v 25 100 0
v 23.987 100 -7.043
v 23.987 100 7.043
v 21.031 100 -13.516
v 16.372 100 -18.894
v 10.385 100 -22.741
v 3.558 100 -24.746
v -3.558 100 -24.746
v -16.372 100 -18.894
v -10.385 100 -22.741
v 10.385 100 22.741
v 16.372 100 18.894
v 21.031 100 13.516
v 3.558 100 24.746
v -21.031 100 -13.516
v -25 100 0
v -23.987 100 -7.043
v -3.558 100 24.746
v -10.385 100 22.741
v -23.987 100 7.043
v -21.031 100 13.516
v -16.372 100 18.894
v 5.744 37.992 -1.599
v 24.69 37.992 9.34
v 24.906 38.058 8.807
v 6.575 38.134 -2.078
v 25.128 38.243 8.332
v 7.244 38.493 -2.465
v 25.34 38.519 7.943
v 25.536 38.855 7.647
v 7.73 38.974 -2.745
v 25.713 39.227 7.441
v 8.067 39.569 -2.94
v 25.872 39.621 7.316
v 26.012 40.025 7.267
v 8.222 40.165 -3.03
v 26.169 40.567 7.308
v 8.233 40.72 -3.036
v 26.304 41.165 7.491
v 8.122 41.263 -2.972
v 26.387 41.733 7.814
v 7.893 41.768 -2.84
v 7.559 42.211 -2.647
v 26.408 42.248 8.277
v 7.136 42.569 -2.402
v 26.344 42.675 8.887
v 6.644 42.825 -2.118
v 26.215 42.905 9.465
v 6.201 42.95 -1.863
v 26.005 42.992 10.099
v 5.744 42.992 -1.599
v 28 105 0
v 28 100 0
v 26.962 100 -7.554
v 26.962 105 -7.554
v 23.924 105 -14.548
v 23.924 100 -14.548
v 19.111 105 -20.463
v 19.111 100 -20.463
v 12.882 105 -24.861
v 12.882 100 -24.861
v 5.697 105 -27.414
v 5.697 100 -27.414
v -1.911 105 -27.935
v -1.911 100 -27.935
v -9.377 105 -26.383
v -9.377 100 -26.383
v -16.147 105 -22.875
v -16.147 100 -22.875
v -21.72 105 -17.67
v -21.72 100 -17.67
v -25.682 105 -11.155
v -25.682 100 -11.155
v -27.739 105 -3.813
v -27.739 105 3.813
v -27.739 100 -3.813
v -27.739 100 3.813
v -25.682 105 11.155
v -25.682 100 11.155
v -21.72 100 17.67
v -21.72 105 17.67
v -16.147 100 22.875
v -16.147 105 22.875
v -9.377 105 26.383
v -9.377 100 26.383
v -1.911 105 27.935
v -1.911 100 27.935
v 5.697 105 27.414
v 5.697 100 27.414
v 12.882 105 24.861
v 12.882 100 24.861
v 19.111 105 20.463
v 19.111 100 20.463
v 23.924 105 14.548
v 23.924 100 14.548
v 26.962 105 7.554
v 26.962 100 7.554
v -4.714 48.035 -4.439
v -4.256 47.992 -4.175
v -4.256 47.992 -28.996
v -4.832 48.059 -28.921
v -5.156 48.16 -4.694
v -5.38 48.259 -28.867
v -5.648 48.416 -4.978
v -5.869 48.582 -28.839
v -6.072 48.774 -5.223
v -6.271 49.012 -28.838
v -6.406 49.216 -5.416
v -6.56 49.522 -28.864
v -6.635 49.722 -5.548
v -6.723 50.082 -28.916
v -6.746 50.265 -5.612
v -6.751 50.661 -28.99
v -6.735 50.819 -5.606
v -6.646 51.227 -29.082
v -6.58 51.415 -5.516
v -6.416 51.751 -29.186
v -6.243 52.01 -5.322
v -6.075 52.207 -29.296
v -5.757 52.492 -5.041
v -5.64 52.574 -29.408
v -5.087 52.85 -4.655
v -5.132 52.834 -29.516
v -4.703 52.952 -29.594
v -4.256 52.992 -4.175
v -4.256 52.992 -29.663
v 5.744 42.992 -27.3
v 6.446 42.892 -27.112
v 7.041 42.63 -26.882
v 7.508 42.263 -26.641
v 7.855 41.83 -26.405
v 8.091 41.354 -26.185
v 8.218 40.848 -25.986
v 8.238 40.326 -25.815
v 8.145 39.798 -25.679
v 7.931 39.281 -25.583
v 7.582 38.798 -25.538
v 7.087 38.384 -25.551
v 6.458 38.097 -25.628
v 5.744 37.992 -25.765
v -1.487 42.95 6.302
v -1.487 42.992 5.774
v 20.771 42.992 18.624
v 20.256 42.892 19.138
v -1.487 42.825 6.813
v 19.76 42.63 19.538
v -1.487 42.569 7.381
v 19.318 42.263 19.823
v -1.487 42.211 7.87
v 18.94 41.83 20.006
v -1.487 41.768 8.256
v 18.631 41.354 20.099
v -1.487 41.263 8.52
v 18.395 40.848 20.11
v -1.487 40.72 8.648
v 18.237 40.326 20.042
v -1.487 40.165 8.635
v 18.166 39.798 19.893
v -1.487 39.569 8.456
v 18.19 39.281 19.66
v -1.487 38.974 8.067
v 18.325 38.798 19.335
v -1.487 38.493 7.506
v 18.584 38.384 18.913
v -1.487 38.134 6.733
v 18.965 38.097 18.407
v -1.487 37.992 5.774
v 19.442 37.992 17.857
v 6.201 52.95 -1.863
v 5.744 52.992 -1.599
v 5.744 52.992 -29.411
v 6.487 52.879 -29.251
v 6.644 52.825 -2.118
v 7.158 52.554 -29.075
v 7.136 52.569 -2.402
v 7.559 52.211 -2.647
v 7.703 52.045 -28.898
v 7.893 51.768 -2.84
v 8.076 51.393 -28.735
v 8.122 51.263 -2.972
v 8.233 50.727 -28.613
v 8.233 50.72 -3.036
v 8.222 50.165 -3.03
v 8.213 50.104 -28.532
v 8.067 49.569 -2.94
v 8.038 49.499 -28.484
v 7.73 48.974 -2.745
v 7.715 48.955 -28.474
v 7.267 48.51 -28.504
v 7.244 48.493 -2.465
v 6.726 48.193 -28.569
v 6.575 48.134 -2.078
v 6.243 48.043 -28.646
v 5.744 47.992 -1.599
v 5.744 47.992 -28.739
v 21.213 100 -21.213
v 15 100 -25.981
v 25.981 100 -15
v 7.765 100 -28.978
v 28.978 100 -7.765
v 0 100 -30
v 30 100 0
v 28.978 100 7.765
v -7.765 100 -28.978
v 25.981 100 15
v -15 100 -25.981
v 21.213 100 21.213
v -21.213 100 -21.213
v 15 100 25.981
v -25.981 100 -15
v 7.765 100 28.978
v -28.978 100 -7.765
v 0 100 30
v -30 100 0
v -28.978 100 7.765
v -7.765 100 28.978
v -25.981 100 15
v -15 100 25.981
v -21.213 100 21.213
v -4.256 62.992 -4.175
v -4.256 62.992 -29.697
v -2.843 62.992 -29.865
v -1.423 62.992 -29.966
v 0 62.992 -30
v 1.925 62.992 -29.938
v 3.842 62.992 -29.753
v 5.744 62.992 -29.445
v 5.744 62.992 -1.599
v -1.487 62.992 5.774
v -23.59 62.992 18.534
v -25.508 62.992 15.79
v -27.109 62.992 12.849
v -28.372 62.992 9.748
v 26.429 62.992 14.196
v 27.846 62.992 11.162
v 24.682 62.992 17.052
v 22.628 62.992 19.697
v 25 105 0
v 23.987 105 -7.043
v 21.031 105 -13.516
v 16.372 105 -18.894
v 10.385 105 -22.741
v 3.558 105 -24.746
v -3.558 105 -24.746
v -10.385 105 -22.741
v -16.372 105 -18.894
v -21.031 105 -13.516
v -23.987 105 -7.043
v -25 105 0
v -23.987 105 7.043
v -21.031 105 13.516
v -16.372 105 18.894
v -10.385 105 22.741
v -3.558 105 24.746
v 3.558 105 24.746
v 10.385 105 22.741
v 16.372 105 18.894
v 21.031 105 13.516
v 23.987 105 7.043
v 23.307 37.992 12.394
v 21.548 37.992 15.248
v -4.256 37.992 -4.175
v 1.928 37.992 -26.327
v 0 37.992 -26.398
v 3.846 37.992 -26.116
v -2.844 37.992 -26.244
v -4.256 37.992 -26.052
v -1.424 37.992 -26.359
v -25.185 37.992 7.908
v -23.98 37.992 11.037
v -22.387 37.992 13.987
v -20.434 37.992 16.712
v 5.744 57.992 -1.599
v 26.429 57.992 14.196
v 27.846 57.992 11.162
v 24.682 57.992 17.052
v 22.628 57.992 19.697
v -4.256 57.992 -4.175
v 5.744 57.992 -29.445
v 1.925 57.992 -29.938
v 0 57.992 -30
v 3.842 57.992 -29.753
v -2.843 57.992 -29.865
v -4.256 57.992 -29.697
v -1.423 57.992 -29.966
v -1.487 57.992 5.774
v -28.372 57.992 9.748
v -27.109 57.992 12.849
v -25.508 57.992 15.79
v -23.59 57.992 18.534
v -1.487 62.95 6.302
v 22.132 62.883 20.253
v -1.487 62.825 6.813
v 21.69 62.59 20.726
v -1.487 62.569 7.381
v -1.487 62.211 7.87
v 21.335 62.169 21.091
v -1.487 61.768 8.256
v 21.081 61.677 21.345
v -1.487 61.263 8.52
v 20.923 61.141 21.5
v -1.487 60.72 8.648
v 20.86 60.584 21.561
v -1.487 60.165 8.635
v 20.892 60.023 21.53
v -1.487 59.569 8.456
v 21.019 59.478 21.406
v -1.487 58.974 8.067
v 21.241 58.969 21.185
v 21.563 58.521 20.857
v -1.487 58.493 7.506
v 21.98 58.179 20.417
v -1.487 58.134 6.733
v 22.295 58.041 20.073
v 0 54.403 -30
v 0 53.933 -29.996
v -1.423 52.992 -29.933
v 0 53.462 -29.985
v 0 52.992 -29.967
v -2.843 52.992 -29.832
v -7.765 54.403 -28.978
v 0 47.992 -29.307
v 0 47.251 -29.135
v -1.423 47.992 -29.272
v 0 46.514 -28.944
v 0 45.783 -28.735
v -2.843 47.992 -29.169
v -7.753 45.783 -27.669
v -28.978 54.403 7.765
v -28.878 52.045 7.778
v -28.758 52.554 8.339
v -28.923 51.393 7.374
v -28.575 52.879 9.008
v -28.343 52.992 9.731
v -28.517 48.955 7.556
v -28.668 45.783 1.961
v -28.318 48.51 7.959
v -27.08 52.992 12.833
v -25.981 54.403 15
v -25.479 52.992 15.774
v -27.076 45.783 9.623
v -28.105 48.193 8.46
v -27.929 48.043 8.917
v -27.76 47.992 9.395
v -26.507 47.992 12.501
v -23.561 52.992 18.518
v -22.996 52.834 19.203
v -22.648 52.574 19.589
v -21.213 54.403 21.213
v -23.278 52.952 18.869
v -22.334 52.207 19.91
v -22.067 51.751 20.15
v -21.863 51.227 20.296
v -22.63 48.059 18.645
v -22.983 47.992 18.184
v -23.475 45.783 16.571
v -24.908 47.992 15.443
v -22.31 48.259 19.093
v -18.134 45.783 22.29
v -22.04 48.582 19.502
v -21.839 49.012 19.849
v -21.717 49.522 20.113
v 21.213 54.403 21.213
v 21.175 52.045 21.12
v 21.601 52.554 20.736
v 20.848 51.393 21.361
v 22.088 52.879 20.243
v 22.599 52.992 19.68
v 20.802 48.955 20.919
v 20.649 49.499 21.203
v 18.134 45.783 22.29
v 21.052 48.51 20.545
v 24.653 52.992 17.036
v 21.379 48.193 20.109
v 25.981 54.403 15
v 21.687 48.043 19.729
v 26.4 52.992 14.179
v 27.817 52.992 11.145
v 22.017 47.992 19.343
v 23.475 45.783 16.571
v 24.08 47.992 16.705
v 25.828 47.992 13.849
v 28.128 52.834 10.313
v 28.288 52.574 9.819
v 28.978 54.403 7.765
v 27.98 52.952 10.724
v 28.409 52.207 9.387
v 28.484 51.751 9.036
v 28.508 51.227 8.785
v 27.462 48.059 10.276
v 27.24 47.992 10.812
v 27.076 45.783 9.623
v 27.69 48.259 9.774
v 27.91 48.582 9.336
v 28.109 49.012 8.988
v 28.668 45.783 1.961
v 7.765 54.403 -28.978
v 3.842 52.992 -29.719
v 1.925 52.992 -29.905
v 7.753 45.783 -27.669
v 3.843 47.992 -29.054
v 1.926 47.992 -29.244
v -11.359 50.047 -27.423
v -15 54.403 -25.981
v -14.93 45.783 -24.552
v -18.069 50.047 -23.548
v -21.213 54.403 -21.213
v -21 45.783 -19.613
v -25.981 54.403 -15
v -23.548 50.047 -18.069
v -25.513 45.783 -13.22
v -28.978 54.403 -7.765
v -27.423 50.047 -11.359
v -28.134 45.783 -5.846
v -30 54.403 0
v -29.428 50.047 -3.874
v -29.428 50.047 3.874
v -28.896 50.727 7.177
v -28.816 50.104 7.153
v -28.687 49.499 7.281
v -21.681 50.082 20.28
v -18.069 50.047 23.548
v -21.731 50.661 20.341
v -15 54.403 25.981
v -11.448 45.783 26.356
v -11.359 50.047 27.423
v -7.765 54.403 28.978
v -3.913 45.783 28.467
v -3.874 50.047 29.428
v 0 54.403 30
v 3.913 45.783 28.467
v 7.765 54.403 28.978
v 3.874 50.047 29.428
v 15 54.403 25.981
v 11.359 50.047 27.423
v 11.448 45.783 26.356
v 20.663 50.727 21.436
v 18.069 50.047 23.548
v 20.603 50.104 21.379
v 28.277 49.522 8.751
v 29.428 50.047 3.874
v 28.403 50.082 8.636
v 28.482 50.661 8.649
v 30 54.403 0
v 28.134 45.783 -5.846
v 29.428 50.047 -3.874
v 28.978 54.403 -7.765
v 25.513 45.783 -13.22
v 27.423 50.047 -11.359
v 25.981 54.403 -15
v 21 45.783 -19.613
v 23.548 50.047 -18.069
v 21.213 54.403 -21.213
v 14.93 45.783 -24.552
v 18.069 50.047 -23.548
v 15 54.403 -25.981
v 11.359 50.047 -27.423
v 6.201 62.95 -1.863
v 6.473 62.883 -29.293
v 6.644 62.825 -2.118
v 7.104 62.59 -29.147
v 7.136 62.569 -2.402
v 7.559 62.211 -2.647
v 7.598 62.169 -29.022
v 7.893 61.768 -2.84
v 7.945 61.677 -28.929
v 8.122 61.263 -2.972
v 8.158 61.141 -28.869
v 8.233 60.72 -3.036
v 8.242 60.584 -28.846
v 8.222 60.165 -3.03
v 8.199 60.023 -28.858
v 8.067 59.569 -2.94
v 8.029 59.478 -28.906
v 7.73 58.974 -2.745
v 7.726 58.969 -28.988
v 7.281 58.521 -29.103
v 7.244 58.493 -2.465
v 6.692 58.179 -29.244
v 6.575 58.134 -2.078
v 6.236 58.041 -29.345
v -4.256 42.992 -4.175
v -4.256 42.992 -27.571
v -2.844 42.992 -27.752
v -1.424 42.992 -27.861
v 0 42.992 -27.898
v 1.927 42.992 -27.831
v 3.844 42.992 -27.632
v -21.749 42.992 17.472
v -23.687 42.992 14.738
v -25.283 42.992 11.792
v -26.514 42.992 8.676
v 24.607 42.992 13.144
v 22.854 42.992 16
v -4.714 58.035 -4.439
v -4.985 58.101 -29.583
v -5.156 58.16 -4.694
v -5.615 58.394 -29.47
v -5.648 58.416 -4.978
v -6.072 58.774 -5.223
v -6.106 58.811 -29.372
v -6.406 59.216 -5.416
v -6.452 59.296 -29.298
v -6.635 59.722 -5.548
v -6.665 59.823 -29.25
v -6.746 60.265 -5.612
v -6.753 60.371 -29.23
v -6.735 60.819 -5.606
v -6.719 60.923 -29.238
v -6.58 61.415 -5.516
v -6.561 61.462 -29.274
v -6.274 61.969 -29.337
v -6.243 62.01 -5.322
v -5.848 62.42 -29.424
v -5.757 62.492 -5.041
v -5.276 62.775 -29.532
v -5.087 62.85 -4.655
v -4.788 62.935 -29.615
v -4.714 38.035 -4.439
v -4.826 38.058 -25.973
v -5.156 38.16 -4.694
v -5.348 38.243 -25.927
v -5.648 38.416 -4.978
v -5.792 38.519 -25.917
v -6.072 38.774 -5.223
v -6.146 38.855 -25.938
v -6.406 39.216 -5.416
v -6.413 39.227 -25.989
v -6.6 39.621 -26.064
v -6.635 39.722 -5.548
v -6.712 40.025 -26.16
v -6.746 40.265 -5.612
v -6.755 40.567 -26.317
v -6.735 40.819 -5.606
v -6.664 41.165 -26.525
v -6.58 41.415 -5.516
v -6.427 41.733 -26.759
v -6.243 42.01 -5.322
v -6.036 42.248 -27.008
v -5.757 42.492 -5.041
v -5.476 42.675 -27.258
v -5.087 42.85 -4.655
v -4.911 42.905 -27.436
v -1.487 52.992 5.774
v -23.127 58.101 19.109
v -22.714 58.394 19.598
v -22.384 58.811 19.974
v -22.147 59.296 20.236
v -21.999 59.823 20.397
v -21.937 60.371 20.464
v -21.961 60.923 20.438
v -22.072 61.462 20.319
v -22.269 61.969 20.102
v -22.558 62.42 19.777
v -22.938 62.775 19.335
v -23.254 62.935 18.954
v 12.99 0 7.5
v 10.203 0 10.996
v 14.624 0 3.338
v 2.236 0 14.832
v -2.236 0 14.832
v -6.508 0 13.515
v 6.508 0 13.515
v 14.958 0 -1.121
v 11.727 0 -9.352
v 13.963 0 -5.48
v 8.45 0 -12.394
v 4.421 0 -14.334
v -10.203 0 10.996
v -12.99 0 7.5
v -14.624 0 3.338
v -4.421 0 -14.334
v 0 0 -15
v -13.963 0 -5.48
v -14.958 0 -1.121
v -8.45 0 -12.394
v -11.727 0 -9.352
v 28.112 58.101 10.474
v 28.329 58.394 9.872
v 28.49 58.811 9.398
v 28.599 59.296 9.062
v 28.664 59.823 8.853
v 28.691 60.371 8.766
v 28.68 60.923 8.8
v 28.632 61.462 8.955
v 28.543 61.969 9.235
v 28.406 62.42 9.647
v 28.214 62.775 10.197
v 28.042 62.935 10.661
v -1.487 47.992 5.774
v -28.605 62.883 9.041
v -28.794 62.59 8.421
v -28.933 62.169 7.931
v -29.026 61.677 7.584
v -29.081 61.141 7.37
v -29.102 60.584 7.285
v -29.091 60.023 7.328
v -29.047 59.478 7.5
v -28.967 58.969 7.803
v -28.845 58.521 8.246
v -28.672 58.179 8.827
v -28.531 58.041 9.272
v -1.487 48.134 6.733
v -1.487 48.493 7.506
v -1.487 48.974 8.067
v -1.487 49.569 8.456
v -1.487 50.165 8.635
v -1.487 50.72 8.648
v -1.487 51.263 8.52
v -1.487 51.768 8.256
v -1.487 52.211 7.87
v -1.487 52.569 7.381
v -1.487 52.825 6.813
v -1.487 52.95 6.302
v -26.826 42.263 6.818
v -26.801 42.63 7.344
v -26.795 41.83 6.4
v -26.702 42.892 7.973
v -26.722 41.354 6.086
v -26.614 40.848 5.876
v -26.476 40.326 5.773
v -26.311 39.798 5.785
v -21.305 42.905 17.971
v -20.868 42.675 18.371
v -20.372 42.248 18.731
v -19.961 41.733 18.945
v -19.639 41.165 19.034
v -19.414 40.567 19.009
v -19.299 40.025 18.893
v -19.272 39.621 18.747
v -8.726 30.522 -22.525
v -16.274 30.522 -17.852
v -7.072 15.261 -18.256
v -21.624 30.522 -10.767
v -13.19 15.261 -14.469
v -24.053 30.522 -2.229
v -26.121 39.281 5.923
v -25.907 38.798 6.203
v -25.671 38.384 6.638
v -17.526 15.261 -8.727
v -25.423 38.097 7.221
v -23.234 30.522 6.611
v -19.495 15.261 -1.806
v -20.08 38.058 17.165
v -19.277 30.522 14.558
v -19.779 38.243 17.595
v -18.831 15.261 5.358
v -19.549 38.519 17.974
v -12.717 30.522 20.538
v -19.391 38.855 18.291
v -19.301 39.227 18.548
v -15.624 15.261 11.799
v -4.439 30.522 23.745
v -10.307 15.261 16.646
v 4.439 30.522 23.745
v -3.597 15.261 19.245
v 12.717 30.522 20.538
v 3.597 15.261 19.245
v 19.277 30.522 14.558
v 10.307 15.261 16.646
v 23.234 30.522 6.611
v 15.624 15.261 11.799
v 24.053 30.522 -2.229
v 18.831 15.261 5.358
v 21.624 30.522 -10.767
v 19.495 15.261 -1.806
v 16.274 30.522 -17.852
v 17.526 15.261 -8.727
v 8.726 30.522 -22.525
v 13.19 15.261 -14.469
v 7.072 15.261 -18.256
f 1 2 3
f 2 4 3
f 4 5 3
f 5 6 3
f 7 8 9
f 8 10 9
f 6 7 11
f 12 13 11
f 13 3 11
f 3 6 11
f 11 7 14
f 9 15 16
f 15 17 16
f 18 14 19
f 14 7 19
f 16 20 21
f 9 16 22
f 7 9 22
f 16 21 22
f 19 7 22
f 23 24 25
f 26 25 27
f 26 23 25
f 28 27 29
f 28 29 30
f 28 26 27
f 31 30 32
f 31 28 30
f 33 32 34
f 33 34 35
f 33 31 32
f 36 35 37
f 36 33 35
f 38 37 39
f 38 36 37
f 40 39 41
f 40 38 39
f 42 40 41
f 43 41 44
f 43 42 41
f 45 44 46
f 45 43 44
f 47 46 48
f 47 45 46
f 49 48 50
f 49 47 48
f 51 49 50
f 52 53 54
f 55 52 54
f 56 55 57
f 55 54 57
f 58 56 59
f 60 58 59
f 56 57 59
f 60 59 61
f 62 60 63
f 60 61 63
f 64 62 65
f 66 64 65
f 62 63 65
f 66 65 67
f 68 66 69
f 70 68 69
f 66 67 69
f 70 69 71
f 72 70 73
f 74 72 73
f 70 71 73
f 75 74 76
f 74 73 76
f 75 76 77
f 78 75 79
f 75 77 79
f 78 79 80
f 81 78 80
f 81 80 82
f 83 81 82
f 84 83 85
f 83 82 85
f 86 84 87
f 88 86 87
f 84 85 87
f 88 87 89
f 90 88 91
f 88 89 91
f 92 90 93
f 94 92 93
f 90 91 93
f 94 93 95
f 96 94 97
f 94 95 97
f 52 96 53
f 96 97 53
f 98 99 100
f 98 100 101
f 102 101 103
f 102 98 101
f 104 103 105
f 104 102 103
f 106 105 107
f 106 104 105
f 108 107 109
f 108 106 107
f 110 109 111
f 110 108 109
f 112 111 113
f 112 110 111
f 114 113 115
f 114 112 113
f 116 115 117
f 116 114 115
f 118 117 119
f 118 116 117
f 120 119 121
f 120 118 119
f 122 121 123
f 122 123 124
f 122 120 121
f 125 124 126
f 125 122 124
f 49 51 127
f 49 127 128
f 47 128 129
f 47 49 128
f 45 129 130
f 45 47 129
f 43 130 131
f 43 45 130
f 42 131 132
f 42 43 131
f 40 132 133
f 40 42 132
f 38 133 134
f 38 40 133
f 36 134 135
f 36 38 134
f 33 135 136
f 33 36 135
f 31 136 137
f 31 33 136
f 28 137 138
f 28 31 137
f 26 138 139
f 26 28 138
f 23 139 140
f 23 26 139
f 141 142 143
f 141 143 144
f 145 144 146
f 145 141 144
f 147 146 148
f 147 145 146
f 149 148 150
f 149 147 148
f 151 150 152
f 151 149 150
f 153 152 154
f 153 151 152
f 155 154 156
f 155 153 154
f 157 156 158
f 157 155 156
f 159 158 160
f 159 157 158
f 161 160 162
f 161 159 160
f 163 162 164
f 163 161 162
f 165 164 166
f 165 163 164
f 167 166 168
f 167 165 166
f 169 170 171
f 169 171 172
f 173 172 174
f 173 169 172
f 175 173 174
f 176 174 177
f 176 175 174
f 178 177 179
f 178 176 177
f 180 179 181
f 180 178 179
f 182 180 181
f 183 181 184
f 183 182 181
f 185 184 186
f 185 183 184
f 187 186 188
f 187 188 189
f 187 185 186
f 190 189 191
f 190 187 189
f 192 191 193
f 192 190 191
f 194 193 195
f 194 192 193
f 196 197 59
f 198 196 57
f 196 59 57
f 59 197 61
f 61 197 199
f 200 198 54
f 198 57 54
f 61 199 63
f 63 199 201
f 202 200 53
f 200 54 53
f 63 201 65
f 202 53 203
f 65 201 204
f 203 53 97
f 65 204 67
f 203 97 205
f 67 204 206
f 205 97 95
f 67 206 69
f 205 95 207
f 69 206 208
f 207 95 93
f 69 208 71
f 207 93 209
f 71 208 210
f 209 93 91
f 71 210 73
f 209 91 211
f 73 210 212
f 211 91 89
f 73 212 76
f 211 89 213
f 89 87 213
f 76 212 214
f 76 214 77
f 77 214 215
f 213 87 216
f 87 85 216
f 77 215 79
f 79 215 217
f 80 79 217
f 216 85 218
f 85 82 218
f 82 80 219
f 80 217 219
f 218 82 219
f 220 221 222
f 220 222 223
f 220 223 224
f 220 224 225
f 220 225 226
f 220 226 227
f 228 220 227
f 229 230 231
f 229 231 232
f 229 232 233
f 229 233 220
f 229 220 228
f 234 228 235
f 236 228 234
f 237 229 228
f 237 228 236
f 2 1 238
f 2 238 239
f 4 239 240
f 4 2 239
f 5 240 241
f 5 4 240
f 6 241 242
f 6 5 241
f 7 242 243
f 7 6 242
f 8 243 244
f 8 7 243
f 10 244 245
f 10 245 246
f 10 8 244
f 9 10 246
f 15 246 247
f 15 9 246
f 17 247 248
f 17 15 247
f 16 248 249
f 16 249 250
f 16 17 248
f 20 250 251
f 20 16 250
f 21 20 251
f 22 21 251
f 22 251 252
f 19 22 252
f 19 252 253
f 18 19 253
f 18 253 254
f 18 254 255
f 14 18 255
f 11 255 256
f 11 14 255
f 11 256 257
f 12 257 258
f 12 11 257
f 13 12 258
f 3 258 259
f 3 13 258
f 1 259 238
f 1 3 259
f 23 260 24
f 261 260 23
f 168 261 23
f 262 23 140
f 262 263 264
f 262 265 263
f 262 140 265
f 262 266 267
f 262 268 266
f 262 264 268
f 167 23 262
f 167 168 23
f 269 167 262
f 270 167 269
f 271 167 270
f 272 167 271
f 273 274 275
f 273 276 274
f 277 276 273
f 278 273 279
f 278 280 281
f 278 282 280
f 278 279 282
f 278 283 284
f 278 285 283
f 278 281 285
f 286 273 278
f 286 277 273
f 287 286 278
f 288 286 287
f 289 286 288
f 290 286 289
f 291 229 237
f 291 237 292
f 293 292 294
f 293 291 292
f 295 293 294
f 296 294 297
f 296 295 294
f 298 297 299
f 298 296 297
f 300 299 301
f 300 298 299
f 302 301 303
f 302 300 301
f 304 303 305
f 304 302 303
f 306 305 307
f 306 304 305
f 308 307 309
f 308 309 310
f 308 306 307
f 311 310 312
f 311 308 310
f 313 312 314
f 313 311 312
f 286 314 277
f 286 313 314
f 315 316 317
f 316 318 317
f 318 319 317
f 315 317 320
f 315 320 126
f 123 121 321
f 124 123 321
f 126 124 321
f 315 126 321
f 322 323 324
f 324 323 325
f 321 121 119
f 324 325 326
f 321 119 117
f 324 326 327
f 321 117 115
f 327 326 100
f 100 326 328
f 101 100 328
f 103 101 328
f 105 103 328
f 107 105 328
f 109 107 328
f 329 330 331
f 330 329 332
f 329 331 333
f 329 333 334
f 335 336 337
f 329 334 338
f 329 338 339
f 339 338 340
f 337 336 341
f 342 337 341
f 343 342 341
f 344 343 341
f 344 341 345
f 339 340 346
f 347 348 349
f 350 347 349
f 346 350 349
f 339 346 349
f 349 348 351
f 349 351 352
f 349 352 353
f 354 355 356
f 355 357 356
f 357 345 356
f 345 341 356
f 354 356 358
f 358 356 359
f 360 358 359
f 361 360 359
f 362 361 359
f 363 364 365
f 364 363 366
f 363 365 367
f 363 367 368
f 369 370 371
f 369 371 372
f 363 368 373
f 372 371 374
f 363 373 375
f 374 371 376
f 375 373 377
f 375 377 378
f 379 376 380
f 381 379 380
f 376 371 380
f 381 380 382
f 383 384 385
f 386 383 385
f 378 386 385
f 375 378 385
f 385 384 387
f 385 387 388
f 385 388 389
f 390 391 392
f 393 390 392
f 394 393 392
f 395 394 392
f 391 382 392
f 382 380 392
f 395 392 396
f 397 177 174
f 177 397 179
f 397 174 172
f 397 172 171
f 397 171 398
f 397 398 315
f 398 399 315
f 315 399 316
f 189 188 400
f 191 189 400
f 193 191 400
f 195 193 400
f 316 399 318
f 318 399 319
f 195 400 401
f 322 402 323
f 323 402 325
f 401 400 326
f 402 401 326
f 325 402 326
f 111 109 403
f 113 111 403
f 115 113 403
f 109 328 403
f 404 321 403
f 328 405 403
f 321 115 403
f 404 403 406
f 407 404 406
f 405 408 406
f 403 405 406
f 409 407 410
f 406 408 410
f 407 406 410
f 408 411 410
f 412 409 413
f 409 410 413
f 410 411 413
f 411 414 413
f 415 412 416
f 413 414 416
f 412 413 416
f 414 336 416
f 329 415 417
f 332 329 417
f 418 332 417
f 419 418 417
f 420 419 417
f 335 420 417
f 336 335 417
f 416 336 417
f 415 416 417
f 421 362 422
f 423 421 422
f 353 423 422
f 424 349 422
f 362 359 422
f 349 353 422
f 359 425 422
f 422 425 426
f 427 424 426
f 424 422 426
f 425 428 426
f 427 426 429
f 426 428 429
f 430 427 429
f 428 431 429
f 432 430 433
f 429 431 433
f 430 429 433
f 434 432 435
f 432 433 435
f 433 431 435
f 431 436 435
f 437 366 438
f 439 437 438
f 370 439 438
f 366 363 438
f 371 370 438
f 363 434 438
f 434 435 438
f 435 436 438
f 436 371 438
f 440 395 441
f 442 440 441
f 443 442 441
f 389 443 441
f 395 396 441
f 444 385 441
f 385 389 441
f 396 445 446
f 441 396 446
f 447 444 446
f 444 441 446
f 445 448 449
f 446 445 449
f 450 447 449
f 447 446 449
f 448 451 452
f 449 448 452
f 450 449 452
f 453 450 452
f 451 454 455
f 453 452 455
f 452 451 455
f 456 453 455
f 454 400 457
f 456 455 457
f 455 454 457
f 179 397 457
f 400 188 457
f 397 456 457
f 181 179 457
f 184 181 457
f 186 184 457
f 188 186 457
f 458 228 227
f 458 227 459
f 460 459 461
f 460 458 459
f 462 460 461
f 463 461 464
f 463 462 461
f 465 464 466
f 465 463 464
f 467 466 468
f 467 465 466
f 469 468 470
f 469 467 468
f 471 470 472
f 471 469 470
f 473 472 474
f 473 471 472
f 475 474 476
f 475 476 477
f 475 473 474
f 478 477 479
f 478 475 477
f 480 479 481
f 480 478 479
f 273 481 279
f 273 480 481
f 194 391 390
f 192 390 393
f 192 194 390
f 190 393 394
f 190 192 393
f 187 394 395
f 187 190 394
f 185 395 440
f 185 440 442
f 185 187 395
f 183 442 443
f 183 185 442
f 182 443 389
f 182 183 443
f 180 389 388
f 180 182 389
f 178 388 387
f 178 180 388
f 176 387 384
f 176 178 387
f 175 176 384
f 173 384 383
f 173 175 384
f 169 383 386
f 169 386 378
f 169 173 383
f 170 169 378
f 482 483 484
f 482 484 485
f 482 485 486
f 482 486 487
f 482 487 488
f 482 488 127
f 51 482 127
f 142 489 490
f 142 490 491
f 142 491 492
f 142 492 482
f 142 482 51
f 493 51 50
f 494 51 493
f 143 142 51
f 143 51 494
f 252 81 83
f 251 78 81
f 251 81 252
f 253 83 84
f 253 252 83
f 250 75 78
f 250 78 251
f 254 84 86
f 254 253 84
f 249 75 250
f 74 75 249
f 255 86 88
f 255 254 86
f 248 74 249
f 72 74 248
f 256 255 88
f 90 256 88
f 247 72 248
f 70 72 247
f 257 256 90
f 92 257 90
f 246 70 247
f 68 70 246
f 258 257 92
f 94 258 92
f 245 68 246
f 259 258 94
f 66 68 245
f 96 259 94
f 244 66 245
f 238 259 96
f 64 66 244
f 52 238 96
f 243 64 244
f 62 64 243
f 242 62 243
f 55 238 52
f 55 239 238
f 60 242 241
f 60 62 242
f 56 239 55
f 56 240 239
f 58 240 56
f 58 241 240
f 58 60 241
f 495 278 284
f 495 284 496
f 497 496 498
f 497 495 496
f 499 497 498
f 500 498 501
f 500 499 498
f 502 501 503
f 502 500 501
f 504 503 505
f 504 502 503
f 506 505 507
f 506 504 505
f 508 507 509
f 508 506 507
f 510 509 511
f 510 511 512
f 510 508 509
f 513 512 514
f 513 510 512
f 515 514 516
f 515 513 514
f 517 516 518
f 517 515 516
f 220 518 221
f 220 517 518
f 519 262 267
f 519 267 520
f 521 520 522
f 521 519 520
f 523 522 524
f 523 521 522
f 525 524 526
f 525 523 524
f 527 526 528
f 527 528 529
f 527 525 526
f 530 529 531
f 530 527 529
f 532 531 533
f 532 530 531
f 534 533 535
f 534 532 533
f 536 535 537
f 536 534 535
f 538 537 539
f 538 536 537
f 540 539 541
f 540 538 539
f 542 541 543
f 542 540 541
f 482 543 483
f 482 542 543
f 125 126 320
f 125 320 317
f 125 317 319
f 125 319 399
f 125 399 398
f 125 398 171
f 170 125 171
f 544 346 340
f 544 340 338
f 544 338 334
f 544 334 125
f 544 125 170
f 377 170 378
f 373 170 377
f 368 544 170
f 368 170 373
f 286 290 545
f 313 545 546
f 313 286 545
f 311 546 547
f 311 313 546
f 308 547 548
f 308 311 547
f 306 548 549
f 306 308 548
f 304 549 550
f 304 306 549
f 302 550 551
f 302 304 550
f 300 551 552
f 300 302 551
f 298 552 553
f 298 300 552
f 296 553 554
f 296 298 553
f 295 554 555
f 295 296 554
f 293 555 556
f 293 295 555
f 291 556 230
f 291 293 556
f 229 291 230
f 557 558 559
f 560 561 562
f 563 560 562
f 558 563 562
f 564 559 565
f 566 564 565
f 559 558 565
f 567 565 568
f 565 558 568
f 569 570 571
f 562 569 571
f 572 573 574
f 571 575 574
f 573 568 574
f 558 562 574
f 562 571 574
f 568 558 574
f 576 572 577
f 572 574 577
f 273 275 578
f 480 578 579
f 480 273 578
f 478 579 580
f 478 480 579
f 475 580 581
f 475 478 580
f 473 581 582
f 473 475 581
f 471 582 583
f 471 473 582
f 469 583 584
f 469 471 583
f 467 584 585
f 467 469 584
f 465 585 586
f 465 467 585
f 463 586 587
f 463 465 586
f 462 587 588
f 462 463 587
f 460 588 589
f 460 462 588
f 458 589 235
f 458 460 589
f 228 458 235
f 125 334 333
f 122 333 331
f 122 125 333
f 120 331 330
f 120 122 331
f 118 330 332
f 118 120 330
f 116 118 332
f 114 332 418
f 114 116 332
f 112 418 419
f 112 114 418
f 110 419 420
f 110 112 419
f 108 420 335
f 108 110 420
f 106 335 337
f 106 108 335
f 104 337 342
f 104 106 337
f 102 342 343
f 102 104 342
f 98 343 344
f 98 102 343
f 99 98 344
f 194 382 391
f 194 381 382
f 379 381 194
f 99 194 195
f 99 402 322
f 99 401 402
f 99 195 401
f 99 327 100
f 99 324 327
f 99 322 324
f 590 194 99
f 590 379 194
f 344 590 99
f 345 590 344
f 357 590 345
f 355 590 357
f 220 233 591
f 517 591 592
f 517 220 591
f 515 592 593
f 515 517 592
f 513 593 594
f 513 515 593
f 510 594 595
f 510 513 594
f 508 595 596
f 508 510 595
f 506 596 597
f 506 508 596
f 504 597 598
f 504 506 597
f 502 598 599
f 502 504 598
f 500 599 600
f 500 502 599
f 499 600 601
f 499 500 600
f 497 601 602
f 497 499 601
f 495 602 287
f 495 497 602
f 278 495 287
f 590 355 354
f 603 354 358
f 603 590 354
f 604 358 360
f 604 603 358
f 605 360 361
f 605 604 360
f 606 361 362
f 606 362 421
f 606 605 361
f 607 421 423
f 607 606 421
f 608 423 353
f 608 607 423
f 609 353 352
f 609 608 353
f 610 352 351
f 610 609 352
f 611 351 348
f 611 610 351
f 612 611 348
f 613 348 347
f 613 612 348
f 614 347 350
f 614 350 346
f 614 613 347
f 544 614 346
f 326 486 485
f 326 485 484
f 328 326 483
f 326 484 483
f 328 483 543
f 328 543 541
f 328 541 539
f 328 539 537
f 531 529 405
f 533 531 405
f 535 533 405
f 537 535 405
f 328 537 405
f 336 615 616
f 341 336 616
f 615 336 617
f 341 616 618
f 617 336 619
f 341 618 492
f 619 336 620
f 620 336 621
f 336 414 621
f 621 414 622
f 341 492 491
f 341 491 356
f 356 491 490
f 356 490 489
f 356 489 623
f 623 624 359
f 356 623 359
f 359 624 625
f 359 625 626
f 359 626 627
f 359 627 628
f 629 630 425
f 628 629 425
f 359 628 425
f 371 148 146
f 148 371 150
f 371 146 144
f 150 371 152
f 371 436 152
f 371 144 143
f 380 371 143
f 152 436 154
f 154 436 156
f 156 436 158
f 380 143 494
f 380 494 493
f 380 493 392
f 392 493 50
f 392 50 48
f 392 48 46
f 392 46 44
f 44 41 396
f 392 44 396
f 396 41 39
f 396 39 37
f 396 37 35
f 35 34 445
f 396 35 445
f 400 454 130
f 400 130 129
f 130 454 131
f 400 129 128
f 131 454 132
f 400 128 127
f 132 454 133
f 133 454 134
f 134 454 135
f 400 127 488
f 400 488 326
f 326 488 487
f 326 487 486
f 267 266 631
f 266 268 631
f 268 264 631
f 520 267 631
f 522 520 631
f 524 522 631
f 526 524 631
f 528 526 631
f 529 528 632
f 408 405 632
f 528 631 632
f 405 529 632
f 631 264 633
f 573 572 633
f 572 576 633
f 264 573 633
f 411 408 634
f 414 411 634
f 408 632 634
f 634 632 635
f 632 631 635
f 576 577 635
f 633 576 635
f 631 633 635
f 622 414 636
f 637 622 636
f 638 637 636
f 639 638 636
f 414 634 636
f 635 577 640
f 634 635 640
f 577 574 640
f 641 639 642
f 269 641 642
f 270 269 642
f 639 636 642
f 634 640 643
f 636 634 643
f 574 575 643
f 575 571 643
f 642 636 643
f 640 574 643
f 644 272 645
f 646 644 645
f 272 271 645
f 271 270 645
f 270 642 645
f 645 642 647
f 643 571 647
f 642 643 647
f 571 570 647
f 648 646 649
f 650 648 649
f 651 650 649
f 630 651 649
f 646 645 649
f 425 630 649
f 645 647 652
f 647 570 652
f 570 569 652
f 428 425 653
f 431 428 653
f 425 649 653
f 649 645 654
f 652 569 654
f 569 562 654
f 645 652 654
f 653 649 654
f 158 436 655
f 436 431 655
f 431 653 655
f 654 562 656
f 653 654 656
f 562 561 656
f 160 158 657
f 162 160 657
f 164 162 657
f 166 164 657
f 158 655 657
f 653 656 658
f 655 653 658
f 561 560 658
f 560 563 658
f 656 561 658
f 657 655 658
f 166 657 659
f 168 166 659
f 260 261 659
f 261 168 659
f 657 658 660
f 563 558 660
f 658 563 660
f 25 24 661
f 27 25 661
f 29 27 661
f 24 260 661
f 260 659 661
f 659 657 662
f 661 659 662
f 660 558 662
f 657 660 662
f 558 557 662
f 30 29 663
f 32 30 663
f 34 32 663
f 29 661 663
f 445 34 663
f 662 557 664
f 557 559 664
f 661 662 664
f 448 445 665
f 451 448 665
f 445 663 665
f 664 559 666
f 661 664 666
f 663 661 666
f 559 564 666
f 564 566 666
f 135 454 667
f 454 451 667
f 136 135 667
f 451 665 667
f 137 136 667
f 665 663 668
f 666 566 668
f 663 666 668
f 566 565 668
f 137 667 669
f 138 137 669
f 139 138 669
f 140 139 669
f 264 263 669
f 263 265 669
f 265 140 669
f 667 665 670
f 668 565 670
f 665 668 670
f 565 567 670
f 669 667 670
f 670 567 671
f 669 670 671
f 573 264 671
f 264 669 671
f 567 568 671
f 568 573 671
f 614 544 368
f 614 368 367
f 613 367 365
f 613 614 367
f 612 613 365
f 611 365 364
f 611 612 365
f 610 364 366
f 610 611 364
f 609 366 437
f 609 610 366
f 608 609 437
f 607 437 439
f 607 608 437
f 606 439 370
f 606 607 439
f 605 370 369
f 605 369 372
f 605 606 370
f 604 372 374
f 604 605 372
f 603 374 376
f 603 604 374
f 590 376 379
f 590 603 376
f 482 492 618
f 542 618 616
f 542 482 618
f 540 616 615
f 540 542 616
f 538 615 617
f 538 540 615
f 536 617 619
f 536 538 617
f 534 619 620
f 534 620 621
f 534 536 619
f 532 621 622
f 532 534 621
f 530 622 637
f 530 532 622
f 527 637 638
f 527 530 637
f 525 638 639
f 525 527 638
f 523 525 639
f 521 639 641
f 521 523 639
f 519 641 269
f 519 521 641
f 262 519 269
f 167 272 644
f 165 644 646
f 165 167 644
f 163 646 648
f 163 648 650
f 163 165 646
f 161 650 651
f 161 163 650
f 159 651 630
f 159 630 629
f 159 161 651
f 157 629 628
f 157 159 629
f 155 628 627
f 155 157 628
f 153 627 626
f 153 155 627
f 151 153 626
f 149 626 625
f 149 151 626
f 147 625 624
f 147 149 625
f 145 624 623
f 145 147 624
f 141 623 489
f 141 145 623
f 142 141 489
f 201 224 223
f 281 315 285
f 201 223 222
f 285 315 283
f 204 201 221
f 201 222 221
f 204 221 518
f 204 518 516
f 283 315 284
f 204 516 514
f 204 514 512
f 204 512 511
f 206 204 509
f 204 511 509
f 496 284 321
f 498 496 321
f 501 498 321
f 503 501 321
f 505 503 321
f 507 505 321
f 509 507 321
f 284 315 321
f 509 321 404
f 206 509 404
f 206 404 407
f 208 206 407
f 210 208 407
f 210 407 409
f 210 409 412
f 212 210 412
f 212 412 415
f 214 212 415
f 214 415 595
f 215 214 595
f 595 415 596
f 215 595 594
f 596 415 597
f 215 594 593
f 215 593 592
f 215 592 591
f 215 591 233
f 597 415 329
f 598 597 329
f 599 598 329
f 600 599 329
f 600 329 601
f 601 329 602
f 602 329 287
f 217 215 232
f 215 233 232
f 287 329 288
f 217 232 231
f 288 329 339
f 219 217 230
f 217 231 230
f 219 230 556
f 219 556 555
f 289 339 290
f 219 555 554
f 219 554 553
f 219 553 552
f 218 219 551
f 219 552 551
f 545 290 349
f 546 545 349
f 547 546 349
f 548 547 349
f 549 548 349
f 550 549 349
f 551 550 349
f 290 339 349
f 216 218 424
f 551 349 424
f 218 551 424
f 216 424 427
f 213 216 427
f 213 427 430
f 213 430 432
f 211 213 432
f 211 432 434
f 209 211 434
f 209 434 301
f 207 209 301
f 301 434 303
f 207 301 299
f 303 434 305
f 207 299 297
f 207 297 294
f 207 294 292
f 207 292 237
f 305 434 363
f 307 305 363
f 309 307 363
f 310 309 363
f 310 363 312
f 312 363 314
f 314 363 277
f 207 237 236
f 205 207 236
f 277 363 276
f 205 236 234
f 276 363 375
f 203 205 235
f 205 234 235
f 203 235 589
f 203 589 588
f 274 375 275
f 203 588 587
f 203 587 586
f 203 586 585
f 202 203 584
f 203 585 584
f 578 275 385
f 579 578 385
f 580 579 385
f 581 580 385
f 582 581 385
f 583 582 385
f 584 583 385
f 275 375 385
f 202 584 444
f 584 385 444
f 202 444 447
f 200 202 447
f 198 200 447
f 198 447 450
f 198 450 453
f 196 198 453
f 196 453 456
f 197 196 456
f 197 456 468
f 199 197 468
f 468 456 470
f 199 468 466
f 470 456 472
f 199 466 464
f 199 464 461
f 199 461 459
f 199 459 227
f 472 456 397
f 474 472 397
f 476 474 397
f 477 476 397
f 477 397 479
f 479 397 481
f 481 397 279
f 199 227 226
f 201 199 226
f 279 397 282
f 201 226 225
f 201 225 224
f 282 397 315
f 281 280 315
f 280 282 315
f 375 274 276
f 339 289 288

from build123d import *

# Parameters (mm, degrees)
SKETCH4_R                = 28
SKETCH4_R_2              = 25
EXTRUDE_THIN1_DEPTH      = 5
CUT_EXTRUDE1_DEPTH       = 114.247516529
LPATTERN1_COUNT          = 3
LPATTERN1_PITCH          = 10
CIRPATTERN7_COUNT        = 3
CIRPATTERN7_COPY_1_DEPTH = 114.247516529
CIRPATTERN7_COPY_2_DEPTH = 114.247516529
CIRPATTERN7_COPY_3_DEPTH = 114.247516529
CIRPATTERN7_COPY_4_DEPTH = 114.247516529


with BuildPart() as part:
    # Sketch3 → Revolve1 (revolve)
    with BuildSketch(Plane.XY, mode=Mode.PRIVATE) as revolve1_sk:
        with BuildLine():
            Line((0, 0), (0, 100))
            Line((0, 100), (30, 100))
            Line((30, 100), (30, 54.403065089))
            ThreePointArc((30, 54.403065089), (29.682011865, 50.046670749), (28.734788557, 45.782628522))
            Line((28.734788557, 45.782628522), (15, 0))
            Line((15, 0), (0, 0))
        make_face()
    revolve(revolve1_sk.sketch.rotate(Axis((0, 0, 0), (0, 1, 0)), 90), axis=Axis((0, 0, 0), (0, 1, 0)))

    # Sketch4 → Extrude-Thin1 (add)
    with BuildSketch(Plane(origin=(0, 100, 0), x_dir=(1, 0, 0), z_dir=(0, 1, 0))):
        Circle(SKETCH4_R)
        Circle(SKETCH4_R_2, mode=Mode.SUBTRACT)
    extrude(amount=EXTRUDE_THIN1_DEPTH)

    # Sketch9 → Cut-Extrude1 (cut, through all)
    with BuildSketch(Plane.XY):
        with BuildLine():
            Line((-4.256347382, 62.992288971), (5.743652618, 62.992288971))
            ThreePointArc((5.743652618, 62.992288971), (8.243652618, 60.492288971), (5.743652618, 57.992288971))
            Line((5.743652618, 57.992288971), (-4.256347382, 57.992288971))
            ThreePointArc((-4.256347382, 57.992288971), (-6.756347382, 60.492288971), (-4.256347382, 62.992288971))
        make_face()
    cut_extrude1 = extrude(amount=-CUT_EXTRUDE1_DEPTH, mode=Mode.SUBTRACT)

    # LPattern1: Cut-Extrude1 ×3
    with Locations(*[(0, -i * LPATTERN1_PITCH, 0) for i in range(1, LPATTERN1_COUNT)]):
        add(cut_extrude1, mode=Mode.SUBTRACT)

    # CirPattern7: Cut-Extrude1 ×3 about axis
    cirpattern7_axis = Axis((0, 0, 0), (0, -1, 0))
    for i in range(1, CIRPATTERN7_COUNT):
        add(cut_extrude1.rotate(cirpattern7_axis, i * 360 / CIRPATTERN7_COUNT), mode=Mode.SUBTRACT)

    # CirPattern7 copy 1 sketch → CirPattern7 copy 1 (cut, through all)
    with BuildSketch(Plane(origin=(0, -10, 0), x_dir=(-0.4999999999999998, 0, 0.8660254037844387), z_dir=(-0.8660254037844387, 0, -0.4999999999999998))):
        with BuildLine():
            Line((-4.256347382, 62.992288971), (5.743652618, 62.992288971))
            ThreePointArc((5.743652618, 62.992288971), (8.243652618, 60.492288971), (5.743652618, 57.992288971))
            Line((5.743652618, 57.992288971), (-4.256347382, 57.992288971))
            ThreePointArc((-4.256347382, 57.992288971), (-6.756347382, 60.492288971), (-4.256347382, 62.992288971))
        make_face()
    extrude(amount=-CIRPATTERN7_COPY_1_DEPTH, mode=Mode.SUBTRACT)

    # CirPattern7 copy 2 sketch → CirPattern7 copy 2 (cut, through all)
    with BuildSketch(Plane(origin=(0, -10, 0), x_dir=(-0.5000000000000004, 0, -0.8660254037844384), z_dir=(0.8660254037844384, 0, -0.5000000000000004))):
        with BuildLine():
            Line((-4.256347382, 62.992288971), (5.743652618, 62.992288971))
            ThreePointArc((5.743652618, 62.992288971), (8.243652618, 60.492288971), (5.743652618, 57.992288971))
            Line((5.743652618, 57.992288971), (-4.256347382, 57.992288971))
            ThreePointArc((-4.256347382, 57.992288971), (-6.756347382, 60.492288971), (-4.256347382, 62.992288971))
        make_face()
    extrude(amount=-CIRPATTERN7_COPY_2_DEPTH, mode=Mode.SUBTRACT)

    # CirPattern7 copy 3 sketch → CirPattern7 copy 3 (cut, through all)
    with BuildSketch(Plane(origin=(0, -20, 0), x_dir=(-0.4999999999999998, 0, 0.8660254037844387), z_dir=(-0.8660254037844387, 0, -0.4999999999999998))):
        with BuildLine():
            Line((-4.256347382, 62.992288971), (5.743652618, 62.992288971))
            ThreePointArc((5.743652618, 62.992288971), (8.243652618, 60.492288971), (5.743652618, 57.992288971))
            Line((5.743652618, 57.992288971), (-4.256347382, 57.992288971))
            ThreePointArc((-4.256347382, 57.992288971), (-6.756347382, 60.492288971), (-4.256347382, 62.992288971))
        make_face()
    extrude(amount=-CIRPATTERN7_COPY_3_DEPTH, mode=Mode.SUBTRACT)

    # CirPattern7 copy 4 sketch → CirPattern7 copy 4 (cut, through all)
    with BuildSketch(Plane(origin=(0, -20, 0), x_dir=(-0.5000000000000004, 0, -0.8660254037844384), z_dir=(0.8660254037844384, 0, -0.5000000000000004))):
        with BuildLine():
            Line((-4.256347382, 62.992288971), (5.743652618, 62.992288971))
            ThreePointArc((5.743652618, 62.992288971), (8.243652618, 60.492288971), (5.743652618, 57.992288971))
            Line((5.743652618, 57.992288971), (-4.256347382, 57.992288971))
            ThreePointArc((-4.256347382, 57.992288971), (-6.756347382, 60.492288971), (-4.256347382, 62.992288971))
        make_face()
    extrude(amount=-CIRPATTERN7_COPY_4_DEPTH, mode=Mode.SUBTRACT)


solid = part.part
